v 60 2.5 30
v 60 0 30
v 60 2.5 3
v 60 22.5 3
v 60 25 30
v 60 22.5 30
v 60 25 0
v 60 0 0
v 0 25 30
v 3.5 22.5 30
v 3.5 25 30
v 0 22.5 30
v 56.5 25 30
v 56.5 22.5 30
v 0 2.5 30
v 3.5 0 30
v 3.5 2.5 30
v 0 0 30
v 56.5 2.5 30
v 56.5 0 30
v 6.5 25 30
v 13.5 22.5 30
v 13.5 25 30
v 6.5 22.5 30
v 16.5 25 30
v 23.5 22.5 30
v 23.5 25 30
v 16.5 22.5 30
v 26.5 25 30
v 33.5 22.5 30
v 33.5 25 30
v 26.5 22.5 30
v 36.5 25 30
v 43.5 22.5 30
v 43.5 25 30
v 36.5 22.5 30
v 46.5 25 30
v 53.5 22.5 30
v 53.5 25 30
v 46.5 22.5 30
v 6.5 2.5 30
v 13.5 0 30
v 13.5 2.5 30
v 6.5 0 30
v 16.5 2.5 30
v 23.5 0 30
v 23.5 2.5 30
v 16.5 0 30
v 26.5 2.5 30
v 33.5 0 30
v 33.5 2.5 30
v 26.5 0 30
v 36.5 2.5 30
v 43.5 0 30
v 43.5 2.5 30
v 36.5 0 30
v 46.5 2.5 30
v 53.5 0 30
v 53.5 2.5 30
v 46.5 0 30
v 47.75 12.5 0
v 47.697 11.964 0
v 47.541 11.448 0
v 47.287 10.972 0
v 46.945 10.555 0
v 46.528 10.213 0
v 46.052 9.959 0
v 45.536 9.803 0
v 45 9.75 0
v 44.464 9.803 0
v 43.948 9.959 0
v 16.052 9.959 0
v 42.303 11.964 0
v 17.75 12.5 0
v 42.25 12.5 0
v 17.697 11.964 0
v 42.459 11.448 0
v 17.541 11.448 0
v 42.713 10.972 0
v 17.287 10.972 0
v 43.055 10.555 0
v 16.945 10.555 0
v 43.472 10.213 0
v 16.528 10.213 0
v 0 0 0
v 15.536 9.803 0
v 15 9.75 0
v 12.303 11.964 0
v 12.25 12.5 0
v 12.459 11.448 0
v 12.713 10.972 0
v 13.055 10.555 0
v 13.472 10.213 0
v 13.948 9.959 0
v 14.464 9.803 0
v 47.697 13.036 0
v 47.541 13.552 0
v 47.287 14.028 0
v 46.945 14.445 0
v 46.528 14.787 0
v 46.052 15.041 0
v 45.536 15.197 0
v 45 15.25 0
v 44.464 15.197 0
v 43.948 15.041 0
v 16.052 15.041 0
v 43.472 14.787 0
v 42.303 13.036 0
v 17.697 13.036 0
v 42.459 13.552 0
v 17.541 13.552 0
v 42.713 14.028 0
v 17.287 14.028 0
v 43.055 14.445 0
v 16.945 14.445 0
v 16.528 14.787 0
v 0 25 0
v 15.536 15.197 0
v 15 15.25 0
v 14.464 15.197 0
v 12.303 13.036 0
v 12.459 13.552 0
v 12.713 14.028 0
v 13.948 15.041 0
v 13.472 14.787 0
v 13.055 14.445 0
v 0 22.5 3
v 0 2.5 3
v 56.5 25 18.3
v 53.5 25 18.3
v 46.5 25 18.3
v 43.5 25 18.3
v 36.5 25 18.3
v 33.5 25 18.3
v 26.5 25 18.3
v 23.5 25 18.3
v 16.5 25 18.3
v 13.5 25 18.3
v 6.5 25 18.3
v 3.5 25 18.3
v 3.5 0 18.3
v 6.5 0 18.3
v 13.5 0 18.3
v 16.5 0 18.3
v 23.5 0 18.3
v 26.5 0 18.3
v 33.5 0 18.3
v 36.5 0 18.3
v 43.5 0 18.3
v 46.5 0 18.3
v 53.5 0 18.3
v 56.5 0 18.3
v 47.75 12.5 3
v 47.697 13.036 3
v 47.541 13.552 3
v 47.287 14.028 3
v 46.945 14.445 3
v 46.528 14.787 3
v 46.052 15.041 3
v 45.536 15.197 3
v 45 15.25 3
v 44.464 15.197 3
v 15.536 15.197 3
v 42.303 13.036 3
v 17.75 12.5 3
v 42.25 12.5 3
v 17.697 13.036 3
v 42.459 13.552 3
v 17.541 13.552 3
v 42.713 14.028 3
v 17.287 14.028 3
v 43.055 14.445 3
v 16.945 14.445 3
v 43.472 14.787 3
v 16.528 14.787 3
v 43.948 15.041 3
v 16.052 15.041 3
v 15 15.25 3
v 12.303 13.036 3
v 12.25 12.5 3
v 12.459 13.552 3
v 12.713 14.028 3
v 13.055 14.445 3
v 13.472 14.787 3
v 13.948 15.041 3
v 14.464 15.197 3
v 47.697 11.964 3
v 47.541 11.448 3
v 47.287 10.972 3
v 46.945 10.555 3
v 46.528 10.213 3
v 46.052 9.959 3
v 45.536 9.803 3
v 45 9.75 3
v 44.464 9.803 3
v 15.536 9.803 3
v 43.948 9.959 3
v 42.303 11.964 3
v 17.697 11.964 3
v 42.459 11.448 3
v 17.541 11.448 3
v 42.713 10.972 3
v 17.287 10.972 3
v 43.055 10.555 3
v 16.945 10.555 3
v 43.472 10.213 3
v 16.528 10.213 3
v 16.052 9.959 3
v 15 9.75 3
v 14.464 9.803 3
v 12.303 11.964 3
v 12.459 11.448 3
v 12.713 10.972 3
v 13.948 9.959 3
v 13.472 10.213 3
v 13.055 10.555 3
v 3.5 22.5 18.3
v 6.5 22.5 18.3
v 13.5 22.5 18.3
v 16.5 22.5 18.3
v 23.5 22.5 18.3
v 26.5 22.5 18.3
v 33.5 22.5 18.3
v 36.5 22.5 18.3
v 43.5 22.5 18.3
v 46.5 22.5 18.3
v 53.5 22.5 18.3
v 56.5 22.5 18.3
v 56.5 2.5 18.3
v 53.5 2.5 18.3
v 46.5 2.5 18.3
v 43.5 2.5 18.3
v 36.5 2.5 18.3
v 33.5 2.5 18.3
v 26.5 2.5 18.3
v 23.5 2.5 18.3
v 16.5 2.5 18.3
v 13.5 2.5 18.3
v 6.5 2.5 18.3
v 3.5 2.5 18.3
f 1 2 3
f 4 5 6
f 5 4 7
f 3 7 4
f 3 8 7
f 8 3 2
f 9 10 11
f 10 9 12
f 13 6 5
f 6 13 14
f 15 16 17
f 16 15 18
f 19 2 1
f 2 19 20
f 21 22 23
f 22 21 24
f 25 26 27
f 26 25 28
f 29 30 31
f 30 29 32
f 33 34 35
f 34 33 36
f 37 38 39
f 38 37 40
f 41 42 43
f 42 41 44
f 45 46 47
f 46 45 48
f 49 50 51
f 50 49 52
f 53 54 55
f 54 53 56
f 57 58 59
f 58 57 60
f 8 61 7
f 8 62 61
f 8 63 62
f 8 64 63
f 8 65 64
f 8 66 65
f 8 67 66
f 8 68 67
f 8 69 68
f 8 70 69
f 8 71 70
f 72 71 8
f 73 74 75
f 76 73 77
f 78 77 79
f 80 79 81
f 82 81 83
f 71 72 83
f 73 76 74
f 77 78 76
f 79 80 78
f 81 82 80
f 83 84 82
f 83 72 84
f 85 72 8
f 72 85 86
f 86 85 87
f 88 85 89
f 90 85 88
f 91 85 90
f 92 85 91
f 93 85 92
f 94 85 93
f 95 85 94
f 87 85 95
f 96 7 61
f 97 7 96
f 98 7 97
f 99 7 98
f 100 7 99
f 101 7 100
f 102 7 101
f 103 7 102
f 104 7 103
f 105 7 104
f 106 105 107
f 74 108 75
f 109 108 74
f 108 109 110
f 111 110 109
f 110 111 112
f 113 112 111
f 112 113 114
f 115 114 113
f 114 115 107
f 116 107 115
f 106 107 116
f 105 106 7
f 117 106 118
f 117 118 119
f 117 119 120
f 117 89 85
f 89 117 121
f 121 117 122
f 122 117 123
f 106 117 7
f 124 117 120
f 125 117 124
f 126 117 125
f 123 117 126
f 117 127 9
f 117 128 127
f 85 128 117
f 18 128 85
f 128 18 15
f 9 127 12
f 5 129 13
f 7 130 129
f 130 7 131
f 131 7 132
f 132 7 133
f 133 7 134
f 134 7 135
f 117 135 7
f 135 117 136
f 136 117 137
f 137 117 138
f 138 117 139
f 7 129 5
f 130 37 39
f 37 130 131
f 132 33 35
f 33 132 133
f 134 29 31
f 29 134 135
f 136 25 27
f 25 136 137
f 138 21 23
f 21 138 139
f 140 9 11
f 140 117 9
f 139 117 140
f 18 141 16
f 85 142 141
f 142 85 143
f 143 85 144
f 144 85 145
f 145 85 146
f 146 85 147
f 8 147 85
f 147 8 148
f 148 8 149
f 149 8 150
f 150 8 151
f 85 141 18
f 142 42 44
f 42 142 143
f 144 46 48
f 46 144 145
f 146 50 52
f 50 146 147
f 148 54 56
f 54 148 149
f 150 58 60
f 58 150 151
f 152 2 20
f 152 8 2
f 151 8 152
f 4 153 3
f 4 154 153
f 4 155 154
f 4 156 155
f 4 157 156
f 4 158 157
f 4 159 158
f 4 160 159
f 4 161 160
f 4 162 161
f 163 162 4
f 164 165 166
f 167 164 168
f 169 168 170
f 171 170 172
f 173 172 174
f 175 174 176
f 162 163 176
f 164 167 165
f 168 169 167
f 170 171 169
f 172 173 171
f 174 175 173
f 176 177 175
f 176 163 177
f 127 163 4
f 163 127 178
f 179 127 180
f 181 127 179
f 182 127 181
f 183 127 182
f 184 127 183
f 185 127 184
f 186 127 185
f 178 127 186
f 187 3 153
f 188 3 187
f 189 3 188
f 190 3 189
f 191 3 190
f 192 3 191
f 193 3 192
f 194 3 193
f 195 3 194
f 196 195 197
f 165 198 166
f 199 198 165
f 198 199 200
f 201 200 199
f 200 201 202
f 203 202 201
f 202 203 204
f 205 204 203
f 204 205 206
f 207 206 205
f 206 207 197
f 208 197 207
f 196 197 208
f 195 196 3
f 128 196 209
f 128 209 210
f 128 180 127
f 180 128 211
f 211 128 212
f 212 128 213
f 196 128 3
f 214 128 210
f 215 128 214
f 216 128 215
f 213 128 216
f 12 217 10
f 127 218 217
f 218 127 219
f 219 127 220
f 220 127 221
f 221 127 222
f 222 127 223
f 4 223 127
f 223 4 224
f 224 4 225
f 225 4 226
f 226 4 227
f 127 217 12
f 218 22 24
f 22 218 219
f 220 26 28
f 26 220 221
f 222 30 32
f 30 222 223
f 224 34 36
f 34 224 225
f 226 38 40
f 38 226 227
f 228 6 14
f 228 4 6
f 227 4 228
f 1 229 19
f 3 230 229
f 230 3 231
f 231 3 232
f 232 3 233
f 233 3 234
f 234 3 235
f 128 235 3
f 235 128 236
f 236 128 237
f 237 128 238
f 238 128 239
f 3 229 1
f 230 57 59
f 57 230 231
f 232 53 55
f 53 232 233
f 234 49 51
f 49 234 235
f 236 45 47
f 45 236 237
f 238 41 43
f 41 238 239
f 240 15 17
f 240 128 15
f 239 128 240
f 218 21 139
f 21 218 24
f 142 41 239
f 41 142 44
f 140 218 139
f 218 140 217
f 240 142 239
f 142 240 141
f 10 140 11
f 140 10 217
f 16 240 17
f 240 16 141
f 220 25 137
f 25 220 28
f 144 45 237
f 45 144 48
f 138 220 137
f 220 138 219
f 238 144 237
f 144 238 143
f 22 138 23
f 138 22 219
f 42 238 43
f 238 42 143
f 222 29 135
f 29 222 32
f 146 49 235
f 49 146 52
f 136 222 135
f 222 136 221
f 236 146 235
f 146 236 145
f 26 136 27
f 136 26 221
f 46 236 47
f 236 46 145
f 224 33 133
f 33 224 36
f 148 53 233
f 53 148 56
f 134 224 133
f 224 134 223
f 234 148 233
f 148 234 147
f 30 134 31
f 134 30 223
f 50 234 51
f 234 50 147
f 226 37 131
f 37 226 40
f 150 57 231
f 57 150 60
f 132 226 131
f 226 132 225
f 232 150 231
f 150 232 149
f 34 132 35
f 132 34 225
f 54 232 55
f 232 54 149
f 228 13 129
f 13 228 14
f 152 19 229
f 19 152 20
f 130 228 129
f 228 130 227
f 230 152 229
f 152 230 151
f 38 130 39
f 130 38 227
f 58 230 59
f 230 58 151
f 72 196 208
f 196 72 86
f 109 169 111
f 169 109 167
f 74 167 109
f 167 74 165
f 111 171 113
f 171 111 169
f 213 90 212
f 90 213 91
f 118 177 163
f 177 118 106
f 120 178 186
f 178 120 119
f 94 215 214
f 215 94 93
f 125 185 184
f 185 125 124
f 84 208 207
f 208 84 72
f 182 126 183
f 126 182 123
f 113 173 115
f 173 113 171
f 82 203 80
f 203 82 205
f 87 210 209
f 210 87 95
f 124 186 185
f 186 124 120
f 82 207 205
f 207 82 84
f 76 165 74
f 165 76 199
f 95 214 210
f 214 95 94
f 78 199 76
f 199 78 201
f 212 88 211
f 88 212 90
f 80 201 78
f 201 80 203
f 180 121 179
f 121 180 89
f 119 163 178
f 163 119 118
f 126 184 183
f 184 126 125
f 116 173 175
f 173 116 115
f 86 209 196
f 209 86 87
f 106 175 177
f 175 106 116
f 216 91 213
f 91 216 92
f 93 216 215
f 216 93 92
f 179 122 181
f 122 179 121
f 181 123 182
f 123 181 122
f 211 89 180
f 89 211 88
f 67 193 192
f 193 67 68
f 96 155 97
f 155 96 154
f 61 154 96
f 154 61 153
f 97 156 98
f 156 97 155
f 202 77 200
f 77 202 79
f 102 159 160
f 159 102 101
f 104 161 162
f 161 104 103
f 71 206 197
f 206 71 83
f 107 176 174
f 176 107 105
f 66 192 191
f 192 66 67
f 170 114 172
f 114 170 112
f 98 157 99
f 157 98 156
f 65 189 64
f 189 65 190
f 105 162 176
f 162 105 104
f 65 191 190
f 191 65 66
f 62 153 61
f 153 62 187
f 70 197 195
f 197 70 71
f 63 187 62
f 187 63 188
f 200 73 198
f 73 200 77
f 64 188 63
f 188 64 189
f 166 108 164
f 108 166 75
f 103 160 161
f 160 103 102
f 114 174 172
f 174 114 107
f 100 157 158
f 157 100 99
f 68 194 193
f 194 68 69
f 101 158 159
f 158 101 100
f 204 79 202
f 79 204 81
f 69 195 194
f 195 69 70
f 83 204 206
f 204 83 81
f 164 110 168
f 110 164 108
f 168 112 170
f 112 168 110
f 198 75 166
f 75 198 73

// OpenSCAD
$fn = 32;

// ----------------------------------------------------------------------
// Cable duct: 60 x 25 x 30 mm, 6 fingers
// ----------------------------------------------------------------------

// --- parameters (mm) ---
channel_l = 60;           // duct length, X
channel_w = 25;           // duct width, Y
channel_h = 30;           // duct height, Z
channel_t = 2.5;          // side wall thickness
floor_t = 3;              // floor thickness
slot_w = 3;               // finger slot width
slot_h = 15.3;            // finger slot height
fingers = 6;              // number of finger slots per side
pitch = 10;               // finger pitch
hole_d = 5.5;             // floor mounting hole
hole_n = 2;               // mounting holes in the floor

module shell() {
  difference() {
    cube([channel_l, channel_w, channel_h]);
    /* open top channel */
    translate([-channel_t - 1, channel_t, floor_t])
      cube([channel_l + 2 * channel_t + 2, channel_w - 2 * channel_t, channel_h + 1]);
  }
}

difference() {
  union() {
    shell();
  }
  /* finger slots cut through both side walls */
  for (i = [0 : fingers - 1]) translate([pitch / 2 + i * pitch - slot_w / 2, -1, floor_t + slot_h]) cube([slot_w, channel_w + 2, channel_h]);
  for (i = [0 : hole_n - 1]) translate([(channel_l / hole_n) * (i + 0.5), channel_w / 2, -1]) cylinder(h = floor_t + 2, d = hole_d);
}
